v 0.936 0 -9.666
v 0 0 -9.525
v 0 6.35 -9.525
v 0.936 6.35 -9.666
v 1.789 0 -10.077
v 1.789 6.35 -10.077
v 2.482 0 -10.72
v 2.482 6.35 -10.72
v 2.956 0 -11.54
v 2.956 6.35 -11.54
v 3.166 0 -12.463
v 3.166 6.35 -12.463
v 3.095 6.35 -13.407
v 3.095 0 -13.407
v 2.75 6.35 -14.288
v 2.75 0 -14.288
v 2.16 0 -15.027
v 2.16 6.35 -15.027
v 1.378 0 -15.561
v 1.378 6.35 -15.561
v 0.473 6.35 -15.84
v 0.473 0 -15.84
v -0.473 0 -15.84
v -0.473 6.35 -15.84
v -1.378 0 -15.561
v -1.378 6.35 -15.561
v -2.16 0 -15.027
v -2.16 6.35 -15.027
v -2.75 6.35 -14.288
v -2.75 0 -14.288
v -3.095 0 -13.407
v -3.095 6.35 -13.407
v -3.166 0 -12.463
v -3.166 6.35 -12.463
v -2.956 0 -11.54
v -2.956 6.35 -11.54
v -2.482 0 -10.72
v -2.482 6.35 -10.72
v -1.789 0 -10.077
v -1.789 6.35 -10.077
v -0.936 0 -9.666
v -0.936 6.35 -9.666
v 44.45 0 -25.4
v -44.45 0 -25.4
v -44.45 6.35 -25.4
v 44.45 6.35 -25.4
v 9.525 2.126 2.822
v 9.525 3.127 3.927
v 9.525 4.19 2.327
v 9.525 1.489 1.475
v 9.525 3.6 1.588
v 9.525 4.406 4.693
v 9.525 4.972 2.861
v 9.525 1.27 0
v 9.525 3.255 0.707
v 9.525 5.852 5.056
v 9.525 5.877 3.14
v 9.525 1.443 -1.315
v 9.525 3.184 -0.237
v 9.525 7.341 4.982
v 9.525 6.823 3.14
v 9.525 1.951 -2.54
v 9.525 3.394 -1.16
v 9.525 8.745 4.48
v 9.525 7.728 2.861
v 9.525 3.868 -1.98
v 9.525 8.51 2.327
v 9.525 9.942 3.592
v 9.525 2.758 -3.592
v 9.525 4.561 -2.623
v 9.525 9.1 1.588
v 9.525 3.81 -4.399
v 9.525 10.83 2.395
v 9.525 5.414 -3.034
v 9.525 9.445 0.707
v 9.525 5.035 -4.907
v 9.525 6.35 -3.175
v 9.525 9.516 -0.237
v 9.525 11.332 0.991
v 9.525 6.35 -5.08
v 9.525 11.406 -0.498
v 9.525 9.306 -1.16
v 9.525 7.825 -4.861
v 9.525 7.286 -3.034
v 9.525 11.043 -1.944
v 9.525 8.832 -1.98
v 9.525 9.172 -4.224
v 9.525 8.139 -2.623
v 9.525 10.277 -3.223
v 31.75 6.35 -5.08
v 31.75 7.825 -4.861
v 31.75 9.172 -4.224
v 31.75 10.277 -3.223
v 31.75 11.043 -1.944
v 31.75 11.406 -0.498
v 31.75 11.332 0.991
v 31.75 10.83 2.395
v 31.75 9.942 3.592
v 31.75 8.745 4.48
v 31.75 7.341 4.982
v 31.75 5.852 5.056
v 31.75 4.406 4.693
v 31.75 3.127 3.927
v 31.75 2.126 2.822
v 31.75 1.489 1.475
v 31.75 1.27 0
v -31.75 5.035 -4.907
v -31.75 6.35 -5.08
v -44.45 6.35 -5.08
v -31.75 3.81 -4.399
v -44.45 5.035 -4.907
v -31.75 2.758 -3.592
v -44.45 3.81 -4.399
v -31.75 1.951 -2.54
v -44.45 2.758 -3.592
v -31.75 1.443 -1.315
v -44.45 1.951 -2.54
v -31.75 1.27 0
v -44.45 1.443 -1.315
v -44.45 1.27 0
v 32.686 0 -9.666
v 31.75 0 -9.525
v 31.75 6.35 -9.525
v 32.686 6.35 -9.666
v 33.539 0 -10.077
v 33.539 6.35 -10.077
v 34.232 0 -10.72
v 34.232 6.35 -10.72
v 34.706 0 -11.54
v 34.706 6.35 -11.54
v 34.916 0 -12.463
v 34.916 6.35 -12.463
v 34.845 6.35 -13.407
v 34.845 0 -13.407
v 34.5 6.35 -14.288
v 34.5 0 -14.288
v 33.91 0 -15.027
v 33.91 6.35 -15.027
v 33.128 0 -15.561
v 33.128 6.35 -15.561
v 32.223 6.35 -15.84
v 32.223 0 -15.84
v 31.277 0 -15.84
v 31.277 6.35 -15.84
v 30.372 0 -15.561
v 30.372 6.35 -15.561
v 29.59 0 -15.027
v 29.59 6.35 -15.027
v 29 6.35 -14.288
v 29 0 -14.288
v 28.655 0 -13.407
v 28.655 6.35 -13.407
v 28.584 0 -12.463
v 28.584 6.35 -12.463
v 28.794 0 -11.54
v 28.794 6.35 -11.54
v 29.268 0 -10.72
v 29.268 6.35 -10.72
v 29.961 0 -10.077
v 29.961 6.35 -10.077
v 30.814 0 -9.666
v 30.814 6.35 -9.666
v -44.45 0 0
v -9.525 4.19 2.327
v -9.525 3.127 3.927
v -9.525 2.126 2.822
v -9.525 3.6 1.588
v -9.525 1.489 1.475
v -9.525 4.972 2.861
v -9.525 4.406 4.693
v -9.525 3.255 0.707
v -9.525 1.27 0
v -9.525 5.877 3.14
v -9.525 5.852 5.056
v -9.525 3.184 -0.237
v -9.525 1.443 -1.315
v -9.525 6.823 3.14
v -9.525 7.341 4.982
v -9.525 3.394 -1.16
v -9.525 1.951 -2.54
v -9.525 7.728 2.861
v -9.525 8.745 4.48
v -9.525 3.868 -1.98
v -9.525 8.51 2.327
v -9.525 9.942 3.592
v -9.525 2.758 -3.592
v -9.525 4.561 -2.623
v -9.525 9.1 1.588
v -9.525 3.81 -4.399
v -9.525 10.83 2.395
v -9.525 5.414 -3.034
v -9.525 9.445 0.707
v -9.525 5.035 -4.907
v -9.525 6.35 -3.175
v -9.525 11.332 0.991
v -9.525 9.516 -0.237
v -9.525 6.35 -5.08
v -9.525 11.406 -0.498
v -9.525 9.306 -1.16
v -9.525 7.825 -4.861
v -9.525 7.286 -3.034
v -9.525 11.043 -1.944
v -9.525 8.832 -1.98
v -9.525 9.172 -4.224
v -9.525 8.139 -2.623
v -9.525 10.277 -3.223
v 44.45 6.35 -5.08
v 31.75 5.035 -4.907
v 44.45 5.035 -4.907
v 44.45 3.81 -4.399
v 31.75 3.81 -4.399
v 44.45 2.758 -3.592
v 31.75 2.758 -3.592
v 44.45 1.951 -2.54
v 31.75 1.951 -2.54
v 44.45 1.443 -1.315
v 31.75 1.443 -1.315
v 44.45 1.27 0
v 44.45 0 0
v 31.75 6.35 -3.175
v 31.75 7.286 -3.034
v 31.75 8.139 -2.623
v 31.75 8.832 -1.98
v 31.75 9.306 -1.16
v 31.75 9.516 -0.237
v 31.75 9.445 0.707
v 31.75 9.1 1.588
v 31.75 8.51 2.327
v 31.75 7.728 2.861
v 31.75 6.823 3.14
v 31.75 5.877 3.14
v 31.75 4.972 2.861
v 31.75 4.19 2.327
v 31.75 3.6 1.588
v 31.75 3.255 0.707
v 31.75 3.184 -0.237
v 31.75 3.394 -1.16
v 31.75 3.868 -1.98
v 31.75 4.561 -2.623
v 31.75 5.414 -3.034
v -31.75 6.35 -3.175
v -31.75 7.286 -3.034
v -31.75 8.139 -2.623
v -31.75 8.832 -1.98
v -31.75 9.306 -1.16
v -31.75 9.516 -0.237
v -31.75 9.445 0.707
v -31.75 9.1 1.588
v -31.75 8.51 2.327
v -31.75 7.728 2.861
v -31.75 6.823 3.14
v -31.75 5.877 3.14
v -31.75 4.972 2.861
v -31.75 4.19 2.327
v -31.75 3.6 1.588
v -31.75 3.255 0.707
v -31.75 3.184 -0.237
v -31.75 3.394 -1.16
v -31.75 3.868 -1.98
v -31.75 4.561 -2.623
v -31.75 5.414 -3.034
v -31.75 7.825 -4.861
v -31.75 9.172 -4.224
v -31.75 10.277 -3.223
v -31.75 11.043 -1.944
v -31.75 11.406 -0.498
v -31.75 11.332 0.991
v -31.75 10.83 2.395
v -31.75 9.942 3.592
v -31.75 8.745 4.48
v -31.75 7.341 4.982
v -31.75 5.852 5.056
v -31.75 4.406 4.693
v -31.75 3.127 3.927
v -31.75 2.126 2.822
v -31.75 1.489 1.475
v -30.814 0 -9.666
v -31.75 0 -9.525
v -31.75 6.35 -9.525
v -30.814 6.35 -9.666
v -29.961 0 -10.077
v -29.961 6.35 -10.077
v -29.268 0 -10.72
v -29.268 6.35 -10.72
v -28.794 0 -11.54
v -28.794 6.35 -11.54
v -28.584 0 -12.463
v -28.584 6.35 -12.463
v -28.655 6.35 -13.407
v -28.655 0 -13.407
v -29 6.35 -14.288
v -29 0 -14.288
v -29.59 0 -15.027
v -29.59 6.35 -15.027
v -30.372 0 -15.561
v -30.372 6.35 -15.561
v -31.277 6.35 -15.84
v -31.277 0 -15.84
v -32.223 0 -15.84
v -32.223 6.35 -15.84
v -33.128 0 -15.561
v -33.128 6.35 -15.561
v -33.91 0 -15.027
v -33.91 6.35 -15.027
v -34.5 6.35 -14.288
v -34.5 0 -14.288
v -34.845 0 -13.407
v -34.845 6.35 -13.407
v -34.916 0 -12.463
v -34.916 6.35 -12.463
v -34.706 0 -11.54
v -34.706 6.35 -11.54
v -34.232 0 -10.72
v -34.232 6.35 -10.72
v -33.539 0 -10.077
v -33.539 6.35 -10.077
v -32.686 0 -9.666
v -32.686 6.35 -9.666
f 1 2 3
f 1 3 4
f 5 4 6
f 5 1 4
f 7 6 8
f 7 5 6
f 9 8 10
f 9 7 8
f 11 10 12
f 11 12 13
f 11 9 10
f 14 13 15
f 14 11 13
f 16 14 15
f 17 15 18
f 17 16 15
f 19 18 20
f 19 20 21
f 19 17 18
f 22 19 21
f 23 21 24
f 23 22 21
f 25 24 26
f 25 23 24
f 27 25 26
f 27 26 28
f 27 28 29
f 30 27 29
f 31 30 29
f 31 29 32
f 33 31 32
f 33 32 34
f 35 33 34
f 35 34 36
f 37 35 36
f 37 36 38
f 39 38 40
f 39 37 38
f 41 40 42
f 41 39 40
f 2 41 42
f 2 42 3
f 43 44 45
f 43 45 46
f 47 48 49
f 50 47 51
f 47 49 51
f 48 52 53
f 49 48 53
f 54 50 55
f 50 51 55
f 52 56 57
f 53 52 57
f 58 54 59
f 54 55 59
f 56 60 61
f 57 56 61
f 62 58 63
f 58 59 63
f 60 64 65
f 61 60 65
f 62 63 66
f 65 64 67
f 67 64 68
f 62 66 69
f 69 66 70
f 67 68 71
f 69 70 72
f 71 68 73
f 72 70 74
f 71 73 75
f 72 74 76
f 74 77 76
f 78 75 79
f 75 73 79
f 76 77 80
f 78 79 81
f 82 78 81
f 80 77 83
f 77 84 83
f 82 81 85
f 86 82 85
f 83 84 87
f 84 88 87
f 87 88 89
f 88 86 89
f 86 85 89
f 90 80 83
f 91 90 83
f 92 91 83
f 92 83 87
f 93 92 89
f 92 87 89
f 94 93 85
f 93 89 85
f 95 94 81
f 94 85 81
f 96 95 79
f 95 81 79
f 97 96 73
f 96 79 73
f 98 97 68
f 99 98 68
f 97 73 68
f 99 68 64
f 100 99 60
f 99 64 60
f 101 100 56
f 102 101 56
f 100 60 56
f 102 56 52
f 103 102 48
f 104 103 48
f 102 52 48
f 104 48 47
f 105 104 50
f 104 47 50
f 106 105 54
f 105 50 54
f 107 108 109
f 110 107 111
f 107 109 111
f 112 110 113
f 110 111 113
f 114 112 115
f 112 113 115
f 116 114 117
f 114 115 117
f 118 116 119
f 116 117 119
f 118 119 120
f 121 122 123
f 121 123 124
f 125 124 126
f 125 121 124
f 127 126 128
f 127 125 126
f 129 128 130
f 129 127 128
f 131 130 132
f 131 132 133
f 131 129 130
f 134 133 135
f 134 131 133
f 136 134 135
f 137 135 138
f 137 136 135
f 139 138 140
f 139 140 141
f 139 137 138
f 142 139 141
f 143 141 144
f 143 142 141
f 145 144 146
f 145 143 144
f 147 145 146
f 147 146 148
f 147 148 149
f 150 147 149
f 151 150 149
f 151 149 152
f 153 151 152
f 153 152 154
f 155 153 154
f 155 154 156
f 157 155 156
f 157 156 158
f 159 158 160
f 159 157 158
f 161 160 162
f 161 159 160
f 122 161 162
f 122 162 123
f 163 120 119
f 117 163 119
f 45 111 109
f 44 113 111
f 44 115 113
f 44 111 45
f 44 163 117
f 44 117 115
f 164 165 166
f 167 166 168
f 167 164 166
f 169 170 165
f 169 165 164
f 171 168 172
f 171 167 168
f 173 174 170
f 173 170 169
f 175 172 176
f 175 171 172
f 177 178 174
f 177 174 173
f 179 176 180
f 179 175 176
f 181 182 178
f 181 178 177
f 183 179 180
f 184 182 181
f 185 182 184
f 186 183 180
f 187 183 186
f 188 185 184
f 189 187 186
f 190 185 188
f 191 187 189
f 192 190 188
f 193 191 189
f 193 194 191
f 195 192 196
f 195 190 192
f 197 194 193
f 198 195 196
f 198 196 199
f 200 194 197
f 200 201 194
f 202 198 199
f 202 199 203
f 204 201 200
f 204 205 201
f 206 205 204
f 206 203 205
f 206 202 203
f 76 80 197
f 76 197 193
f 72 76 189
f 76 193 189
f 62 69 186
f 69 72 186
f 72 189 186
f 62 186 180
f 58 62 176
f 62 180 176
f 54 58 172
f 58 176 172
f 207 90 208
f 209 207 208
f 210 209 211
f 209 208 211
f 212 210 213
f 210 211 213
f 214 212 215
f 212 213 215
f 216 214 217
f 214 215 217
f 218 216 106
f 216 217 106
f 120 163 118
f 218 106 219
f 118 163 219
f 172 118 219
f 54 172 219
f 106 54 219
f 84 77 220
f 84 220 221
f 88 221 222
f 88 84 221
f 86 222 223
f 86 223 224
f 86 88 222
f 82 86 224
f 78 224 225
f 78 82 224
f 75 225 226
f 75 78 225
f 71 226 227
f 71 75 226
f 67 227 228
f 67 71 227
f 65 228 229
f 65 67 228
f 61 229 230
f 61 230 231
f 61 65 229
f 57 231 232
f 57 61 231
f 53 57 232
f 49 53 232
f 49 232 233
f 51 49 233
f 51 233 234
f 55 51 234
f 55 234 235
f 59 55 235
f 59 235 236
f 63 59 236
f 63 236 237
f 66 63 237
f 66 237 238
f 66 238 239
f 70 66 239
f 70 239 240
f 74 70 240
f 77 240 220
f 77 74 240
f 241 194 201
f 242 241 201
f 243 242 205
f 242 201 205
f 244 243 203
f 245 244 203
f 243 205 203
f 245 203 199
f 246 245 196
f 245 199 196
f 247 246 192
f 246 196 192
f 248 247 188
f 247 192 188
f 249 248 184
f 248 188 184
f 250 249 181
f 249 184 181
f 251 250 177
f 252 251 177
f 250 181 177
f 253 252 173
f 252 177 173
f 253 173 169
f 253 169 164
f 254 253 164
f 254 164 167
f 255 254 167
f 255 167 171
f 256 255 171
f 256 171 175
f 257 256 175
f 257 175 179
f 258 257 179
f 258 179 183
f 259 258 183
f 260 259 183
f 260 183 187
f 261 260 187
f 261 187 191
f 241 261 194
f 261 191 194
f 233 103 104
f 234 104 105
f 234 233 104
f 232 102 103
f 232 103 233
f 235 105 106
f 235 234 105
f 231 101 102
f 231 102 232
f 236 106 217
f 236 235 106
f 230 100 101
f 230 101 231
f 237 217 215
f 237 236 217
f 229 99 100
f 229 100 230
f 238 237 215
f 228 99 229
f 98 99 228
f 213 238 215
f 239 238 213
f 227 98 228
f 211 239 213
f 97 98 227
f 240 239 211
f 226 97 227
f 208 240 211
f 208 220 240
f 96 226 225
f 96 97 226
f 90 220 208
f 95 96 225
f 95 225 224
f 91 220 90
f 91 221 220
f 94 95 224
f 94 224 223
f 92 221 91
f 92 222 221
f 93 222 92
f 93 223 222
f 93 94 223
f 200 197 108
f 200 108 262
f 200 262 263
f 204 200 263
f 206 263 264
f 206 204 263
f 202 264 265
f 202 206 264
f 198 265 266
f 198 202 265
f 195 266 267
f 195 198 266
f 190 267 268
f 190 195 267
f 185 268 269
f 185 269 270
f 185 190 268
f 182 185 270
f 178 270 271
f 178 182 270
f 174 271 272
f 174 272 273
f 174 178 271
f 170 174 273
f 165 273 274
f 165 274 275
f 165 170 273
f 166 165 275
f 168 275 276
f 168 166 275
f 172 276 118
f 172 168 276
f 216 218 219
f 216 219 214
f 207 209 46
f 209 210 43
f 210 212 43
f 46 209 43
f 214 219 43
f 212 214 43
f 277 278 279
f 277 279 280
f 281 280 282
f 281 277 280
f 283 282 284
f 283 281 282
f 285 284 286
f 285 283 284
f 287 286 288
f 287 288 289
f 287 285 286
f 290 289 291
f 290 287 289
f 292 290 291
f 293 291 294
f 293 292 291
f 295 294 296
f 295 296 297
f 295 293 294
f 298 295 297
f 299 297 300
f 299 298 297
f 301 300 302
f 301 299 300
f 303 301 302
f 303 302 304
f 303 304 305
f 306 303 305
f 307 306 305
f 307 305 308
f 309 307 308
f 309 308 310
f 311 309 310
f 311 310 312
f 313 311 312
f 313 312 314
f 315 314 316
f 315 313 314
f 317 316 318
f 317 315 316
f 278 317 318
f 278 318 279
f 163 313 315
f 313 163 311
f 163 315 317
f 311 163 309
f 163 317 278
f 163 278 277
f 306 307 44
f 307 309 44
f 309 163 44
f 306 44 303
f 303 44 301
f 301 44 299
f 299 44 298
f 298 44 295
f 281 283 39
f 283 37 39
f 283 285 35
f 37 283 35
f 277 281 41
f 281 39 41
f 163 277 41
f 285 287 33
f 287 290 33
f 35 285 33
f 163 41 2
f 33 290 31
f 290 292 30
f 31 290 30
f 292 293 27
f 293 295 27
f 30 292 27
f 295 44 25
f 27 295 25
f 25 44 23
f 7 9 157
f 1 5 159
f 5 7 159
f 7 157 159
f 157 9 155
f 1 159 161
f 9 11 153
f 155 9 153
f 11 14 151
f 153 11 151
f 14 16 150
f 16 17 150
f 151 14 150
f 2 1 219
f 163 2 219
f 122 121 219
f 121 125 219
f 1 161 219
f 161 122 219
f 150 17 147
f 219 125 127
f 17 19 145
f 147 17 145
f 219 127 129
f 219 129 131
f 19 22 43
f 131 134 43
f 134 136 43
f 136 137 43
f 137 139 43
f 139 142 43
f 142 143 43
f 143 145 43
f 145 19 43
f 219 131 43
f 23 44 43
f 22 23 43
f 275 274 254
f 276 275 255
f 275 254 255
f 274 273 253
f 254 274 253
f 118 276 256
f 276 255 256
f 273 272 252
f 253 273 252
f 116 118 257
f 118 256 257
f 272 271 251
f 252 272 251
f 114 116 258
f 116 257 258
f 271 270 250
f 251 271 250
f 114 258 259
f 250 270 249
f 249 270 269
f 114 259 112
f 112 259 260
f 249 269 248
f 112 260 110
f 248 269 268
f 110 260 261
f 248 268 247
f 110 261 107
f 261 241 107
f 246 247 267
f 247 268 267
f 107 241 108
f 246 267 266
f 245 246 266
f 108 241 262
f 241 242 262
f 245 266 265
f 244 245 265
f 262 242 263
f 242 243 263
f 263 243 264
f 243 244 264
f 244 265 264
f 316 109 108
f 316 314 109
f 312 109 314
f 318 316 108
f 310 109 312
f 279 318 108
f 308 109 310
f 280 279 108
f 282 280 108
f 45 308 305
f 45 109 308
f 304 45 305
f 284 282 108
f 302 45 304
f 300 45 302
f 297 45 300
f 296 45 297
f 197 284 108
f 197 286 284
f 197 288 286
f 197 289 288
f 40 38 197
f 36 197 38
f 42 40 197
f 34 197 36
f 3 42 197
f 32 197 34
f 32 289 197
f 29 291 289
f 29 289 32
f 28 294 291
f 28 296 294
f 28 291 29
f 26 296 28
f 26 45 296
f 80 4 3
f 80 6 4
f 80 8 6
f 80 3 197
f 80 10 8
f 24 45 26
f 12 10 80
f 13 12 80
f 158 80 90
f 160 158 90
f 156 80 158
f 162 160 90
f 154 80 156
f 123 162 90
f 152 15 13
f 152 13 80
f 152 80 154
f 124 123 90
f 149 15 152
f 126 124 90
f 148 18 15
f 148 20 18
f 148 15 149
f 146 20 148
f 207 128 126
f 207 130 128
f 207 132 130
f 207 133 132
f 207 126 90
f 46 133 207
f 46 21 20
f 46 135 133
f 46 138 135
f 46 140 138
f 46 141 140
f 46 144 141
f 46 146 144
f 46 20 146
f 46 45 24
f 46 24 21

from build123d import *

# Parameters (mm, degrees)
SKETCH2_W           = 88.9
SKETCH2_H           = 25.4
SKETCH2_R           = 3.175
BOSS_EXTRUDE1_DEPTH = 6.35
SKETCH3_R           = 5.08
CUT_EXTRUDE1_DEPTH  = 93.675198948
SKETCH4_R           = 5.08
SKETCH4_R_2         = 3.175
BOSS_EXTRUDE2_DEPTH = 22.225


with BuildPart() as part:
    # Sketch2 → Boss-Extrude1 (new body)
    with BuildSketch(Plane(origin=(0, 0, 0), x_dir=(1, 0, 0), z_dir=(0, 1, 0))):
        with Locations((0, 12.7)):
            Rectangle(SKETCH2_W, SKETCH2_H)
        with Locations(Location((-31.75, 12.7, 0), (0, 0, 270))):
            Circle(SKETCH2_R, mode=Mode.SUBTRACT)
        with Locations(Location((0, 12.7, 0), (0, 0, 270))):
            Circle(SKETCH2_R, mode=Mode.SUBTRACT)
        with Locations(Location((31.75, 12.7, 0), (0, 0, 270))):
            Circle(SKETCH2_R, mode=Mode.SUBTRACT)
    extrude(amount=BOSS_EXTRUDE1_DEPTH)

    # Sketch3 → Cut-Extrude1 (cut, through all)
    with BuildSketch(Plane.ZY.offset(44.45)):
        with Locations((0, 6.35)):
            Circle(SKETCH3_R)
    extrude(amount=-CUT_EXTRUDE1_DEPTH, mode=Mode.SUBTRACT)

    # Sketch4 → Boss-Extrude2 (add)
    with BuildSketch(Plane(origin=(9.525, 0, 0), x_dir=(0, 0, -1), z_dir=(1, 0, 0))):
        with Locations((0, 6.35)):
            Circle(SKETCH4_R)
        with Locations((0, 6.35)):
            Circle(SKETCH4_R_2, mode=Mode.SUBTRACT)
    boss_extrude2 = extrude(amount=BOSS_EXTRUDE2_DEPTH)

    # Mirror1: Boss-Extrude2 across plane
    add(boss_extrude2.mirror(Plane(origin=(0, 0, 0), x_dir=(0, 0, 1), z_dir=(1, 0, 0))))


solid = part.part
